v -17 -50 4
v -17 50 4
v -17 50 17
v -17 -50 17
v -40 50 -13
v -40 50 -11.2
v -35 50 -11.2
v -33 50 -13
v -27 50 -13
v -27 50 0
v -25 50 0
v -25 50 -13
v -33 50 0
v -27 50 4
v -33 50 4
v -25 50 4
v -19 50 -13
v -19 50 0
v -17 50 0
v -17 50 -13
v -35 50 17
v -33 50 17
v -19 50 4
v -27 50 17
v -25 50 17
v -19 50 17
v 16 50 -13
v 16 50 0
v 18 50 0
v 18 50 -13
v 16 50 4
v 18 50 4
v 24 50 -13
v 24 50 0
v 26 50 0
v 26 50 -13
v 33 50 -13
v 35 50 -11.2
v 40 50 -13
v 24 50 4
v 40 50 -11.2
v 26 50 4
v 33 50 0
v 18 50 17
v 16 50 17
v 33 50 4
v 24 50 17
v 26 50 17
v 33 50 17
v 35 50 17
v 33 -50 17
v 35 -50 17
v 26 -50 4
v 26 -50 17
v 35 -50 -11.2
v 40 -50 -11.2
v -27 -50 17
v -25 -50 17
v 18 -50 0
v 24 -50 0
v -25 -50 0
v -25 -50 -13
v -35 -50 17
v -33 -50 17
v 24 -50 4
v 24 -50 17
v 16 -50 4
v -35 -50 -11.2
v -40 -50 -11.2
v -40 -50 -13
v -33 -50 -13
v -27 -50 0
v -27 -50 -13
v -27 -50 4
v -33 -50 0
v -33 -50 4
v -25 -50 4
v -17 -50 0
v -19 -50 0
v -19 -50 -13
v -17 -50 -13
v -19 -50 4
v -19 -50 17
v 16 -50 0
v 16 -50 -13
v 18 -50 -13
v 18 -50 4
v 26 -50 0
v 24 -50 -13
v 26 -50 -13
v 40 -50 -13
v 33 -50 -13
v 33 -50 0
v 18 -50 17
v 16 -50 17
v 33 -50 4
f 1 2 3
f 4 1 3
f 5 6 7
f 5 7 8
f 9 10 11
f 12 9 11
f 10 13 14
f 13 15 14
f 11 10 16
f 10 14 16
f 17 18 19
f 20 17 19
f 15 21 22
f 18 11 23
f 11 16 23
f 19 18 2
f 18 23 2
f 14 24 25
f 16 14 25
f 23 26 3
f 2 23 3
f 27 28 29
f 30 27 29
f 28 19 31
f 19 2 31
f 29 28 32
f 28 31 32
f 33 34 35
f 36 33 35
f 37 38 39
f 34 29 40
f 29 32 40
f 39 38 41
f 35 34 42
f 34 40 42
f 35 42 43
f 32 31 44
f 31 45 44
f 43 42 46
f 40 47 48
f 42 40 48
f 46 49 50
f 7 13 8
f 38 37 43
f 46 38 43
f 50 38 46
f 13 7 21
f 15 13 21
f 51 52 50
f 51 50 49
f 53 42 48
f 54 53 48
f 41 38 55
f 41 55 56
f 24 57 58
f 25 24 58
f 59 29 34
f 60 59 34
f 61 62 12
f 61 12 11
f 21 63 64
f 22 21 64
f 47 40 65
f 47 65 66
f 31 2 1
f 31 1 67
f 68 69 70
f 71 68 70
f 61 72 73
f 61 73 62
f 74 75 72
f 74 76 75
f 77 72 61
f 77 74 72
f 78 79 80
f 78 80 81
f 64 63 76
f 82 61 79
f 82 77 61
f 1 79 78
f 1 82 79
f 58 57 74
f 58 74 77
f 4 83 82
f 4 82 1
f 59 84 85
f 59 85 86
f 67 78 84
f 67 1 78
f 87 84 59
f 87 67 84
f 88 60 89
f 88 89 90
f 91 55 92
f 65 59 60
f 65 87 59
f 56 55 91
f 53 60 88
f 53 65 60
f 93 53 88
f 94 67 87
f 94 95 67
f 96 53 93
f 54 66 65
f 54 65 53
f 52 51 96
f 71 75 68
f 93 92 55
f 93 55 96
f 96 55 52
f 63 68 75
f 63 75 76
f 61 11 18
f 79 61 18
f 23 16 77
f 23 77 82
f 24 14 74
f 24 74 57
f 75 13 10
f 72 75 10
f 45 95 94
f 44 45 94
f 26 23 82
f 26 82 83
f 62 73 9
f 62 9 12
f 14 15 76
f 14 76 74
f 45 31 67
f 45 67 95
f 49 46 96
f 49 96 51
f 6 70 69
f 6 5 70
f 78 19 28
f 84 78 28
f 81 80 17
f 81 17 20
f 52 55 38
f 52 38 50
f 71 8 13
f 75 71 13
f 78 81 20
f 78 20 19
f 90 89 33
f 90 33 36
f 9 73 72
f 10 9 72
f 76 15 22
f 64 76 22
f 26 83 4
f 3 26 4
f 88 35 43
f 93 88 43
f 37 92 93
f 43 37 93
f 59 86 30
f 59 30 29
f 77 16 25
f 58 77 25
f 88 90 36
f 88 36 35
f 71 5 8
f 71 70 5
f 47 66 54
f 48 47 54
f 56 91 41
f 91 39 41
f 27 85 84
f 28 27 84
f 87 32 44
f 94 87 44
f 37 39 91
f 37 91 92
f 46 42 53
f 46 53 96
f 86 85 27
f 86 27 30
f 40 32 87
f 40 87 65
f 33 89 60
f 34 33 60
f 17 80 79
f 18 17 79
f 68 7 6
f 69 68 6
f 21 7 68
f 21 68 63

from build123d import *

# Parameters (mm, degrees)
SKETCH001_W            = 70
SKETCH001_H            = 100
PAD_DEPTH              = 4
SKETCH_W               = 2
SKETCH_H               = 30
PAD001_DEPTH           = 50
PAD001_DEPTH_BACK      = 50
LINEARPATTERN_COUNT    = 3
LINEARPATTERN_PITCH    = 8
LINEARPATTERN001_COUNT = 2
LINEARPATTERN001_PITCH = 51
LINEARPATTERN002_COUNT = 2
LINEARPATTERN002_PITCH = 59
SKETCH002_W            = 7
SKETCH002_H            = 1.8
PAD002_DEPTH           = 50
PAD002_DEPTH_BACK      = 50


with BuildPart() as part:
    # Sketch001 → Pad (new body)
    with BuildSketch(Plane.XY):
        Rectangle(SKETCH001_W, SKETCH001_H)
    extrude(amount=PAD_DEPTH)

    # Sketch → Pad001 (join, two sides)
    with BuildSketch(Plane.XZ) as pad001_sk:
        with Locations((-34, 2)):
            Rectangle(SKETCH_W, SKETCH_H)
    pad001 = extrude(amount=PAD001_DEPTH) + extrude(pad001_sk.sketch, amount=-PAD001_DEPTH_BACK)

    # Mirrored: Pad001 across Sketch V_Axis
    add(pad001.mirror(Plane(origin=(0, 0, 0), x_dir=(0, -1, 0), z_dir=(1, 0, 0))))

    # LinearPattern: Pad001 ×3
    with Locations(*[(i * LINEARPATTERN_PITCH, 0, 0) for i in range(1, LINEARPATTERN_COUNT)]):
        add(pad001)

    # LinearPattern001: Pad001 ×2
    with Locations(*[(i * LINEARPATTERN001_PITCH, 0, 0) for i in range(1, LINEARPATTERN001_COUNT)]):
        add(pad001)

    # LinearPattern002: Pad001 ×2
    with Locations(*[(i * LINEARPATTERN002_PITCH, 0, 0) for i in range(1, LINEARPATTERN002_COUNT)]):
        add(pad001)

    # Sketch002 → Pad002 (join, two sides)
    with BuildSketch(Plane.XZ) as pad002_sk:
        with Locations((36.5, -12.1)):
            Rectangle(SKETCH002_W, SKETCH002_H)
    pad002 = extrude(amount=PAD002_DEPTH) + extrude(pad002_sk.sketch, amount=-PAD002_DEPTH_BACK)

    # Mirrored001: Pad002 across Sketch002 V_Axis
    add(pad002.mirror(Plane(origin=(0, 0, 0), x_dir=(0, -1, 0), z_dir=(1, 0, 0))))


solid = part.part
